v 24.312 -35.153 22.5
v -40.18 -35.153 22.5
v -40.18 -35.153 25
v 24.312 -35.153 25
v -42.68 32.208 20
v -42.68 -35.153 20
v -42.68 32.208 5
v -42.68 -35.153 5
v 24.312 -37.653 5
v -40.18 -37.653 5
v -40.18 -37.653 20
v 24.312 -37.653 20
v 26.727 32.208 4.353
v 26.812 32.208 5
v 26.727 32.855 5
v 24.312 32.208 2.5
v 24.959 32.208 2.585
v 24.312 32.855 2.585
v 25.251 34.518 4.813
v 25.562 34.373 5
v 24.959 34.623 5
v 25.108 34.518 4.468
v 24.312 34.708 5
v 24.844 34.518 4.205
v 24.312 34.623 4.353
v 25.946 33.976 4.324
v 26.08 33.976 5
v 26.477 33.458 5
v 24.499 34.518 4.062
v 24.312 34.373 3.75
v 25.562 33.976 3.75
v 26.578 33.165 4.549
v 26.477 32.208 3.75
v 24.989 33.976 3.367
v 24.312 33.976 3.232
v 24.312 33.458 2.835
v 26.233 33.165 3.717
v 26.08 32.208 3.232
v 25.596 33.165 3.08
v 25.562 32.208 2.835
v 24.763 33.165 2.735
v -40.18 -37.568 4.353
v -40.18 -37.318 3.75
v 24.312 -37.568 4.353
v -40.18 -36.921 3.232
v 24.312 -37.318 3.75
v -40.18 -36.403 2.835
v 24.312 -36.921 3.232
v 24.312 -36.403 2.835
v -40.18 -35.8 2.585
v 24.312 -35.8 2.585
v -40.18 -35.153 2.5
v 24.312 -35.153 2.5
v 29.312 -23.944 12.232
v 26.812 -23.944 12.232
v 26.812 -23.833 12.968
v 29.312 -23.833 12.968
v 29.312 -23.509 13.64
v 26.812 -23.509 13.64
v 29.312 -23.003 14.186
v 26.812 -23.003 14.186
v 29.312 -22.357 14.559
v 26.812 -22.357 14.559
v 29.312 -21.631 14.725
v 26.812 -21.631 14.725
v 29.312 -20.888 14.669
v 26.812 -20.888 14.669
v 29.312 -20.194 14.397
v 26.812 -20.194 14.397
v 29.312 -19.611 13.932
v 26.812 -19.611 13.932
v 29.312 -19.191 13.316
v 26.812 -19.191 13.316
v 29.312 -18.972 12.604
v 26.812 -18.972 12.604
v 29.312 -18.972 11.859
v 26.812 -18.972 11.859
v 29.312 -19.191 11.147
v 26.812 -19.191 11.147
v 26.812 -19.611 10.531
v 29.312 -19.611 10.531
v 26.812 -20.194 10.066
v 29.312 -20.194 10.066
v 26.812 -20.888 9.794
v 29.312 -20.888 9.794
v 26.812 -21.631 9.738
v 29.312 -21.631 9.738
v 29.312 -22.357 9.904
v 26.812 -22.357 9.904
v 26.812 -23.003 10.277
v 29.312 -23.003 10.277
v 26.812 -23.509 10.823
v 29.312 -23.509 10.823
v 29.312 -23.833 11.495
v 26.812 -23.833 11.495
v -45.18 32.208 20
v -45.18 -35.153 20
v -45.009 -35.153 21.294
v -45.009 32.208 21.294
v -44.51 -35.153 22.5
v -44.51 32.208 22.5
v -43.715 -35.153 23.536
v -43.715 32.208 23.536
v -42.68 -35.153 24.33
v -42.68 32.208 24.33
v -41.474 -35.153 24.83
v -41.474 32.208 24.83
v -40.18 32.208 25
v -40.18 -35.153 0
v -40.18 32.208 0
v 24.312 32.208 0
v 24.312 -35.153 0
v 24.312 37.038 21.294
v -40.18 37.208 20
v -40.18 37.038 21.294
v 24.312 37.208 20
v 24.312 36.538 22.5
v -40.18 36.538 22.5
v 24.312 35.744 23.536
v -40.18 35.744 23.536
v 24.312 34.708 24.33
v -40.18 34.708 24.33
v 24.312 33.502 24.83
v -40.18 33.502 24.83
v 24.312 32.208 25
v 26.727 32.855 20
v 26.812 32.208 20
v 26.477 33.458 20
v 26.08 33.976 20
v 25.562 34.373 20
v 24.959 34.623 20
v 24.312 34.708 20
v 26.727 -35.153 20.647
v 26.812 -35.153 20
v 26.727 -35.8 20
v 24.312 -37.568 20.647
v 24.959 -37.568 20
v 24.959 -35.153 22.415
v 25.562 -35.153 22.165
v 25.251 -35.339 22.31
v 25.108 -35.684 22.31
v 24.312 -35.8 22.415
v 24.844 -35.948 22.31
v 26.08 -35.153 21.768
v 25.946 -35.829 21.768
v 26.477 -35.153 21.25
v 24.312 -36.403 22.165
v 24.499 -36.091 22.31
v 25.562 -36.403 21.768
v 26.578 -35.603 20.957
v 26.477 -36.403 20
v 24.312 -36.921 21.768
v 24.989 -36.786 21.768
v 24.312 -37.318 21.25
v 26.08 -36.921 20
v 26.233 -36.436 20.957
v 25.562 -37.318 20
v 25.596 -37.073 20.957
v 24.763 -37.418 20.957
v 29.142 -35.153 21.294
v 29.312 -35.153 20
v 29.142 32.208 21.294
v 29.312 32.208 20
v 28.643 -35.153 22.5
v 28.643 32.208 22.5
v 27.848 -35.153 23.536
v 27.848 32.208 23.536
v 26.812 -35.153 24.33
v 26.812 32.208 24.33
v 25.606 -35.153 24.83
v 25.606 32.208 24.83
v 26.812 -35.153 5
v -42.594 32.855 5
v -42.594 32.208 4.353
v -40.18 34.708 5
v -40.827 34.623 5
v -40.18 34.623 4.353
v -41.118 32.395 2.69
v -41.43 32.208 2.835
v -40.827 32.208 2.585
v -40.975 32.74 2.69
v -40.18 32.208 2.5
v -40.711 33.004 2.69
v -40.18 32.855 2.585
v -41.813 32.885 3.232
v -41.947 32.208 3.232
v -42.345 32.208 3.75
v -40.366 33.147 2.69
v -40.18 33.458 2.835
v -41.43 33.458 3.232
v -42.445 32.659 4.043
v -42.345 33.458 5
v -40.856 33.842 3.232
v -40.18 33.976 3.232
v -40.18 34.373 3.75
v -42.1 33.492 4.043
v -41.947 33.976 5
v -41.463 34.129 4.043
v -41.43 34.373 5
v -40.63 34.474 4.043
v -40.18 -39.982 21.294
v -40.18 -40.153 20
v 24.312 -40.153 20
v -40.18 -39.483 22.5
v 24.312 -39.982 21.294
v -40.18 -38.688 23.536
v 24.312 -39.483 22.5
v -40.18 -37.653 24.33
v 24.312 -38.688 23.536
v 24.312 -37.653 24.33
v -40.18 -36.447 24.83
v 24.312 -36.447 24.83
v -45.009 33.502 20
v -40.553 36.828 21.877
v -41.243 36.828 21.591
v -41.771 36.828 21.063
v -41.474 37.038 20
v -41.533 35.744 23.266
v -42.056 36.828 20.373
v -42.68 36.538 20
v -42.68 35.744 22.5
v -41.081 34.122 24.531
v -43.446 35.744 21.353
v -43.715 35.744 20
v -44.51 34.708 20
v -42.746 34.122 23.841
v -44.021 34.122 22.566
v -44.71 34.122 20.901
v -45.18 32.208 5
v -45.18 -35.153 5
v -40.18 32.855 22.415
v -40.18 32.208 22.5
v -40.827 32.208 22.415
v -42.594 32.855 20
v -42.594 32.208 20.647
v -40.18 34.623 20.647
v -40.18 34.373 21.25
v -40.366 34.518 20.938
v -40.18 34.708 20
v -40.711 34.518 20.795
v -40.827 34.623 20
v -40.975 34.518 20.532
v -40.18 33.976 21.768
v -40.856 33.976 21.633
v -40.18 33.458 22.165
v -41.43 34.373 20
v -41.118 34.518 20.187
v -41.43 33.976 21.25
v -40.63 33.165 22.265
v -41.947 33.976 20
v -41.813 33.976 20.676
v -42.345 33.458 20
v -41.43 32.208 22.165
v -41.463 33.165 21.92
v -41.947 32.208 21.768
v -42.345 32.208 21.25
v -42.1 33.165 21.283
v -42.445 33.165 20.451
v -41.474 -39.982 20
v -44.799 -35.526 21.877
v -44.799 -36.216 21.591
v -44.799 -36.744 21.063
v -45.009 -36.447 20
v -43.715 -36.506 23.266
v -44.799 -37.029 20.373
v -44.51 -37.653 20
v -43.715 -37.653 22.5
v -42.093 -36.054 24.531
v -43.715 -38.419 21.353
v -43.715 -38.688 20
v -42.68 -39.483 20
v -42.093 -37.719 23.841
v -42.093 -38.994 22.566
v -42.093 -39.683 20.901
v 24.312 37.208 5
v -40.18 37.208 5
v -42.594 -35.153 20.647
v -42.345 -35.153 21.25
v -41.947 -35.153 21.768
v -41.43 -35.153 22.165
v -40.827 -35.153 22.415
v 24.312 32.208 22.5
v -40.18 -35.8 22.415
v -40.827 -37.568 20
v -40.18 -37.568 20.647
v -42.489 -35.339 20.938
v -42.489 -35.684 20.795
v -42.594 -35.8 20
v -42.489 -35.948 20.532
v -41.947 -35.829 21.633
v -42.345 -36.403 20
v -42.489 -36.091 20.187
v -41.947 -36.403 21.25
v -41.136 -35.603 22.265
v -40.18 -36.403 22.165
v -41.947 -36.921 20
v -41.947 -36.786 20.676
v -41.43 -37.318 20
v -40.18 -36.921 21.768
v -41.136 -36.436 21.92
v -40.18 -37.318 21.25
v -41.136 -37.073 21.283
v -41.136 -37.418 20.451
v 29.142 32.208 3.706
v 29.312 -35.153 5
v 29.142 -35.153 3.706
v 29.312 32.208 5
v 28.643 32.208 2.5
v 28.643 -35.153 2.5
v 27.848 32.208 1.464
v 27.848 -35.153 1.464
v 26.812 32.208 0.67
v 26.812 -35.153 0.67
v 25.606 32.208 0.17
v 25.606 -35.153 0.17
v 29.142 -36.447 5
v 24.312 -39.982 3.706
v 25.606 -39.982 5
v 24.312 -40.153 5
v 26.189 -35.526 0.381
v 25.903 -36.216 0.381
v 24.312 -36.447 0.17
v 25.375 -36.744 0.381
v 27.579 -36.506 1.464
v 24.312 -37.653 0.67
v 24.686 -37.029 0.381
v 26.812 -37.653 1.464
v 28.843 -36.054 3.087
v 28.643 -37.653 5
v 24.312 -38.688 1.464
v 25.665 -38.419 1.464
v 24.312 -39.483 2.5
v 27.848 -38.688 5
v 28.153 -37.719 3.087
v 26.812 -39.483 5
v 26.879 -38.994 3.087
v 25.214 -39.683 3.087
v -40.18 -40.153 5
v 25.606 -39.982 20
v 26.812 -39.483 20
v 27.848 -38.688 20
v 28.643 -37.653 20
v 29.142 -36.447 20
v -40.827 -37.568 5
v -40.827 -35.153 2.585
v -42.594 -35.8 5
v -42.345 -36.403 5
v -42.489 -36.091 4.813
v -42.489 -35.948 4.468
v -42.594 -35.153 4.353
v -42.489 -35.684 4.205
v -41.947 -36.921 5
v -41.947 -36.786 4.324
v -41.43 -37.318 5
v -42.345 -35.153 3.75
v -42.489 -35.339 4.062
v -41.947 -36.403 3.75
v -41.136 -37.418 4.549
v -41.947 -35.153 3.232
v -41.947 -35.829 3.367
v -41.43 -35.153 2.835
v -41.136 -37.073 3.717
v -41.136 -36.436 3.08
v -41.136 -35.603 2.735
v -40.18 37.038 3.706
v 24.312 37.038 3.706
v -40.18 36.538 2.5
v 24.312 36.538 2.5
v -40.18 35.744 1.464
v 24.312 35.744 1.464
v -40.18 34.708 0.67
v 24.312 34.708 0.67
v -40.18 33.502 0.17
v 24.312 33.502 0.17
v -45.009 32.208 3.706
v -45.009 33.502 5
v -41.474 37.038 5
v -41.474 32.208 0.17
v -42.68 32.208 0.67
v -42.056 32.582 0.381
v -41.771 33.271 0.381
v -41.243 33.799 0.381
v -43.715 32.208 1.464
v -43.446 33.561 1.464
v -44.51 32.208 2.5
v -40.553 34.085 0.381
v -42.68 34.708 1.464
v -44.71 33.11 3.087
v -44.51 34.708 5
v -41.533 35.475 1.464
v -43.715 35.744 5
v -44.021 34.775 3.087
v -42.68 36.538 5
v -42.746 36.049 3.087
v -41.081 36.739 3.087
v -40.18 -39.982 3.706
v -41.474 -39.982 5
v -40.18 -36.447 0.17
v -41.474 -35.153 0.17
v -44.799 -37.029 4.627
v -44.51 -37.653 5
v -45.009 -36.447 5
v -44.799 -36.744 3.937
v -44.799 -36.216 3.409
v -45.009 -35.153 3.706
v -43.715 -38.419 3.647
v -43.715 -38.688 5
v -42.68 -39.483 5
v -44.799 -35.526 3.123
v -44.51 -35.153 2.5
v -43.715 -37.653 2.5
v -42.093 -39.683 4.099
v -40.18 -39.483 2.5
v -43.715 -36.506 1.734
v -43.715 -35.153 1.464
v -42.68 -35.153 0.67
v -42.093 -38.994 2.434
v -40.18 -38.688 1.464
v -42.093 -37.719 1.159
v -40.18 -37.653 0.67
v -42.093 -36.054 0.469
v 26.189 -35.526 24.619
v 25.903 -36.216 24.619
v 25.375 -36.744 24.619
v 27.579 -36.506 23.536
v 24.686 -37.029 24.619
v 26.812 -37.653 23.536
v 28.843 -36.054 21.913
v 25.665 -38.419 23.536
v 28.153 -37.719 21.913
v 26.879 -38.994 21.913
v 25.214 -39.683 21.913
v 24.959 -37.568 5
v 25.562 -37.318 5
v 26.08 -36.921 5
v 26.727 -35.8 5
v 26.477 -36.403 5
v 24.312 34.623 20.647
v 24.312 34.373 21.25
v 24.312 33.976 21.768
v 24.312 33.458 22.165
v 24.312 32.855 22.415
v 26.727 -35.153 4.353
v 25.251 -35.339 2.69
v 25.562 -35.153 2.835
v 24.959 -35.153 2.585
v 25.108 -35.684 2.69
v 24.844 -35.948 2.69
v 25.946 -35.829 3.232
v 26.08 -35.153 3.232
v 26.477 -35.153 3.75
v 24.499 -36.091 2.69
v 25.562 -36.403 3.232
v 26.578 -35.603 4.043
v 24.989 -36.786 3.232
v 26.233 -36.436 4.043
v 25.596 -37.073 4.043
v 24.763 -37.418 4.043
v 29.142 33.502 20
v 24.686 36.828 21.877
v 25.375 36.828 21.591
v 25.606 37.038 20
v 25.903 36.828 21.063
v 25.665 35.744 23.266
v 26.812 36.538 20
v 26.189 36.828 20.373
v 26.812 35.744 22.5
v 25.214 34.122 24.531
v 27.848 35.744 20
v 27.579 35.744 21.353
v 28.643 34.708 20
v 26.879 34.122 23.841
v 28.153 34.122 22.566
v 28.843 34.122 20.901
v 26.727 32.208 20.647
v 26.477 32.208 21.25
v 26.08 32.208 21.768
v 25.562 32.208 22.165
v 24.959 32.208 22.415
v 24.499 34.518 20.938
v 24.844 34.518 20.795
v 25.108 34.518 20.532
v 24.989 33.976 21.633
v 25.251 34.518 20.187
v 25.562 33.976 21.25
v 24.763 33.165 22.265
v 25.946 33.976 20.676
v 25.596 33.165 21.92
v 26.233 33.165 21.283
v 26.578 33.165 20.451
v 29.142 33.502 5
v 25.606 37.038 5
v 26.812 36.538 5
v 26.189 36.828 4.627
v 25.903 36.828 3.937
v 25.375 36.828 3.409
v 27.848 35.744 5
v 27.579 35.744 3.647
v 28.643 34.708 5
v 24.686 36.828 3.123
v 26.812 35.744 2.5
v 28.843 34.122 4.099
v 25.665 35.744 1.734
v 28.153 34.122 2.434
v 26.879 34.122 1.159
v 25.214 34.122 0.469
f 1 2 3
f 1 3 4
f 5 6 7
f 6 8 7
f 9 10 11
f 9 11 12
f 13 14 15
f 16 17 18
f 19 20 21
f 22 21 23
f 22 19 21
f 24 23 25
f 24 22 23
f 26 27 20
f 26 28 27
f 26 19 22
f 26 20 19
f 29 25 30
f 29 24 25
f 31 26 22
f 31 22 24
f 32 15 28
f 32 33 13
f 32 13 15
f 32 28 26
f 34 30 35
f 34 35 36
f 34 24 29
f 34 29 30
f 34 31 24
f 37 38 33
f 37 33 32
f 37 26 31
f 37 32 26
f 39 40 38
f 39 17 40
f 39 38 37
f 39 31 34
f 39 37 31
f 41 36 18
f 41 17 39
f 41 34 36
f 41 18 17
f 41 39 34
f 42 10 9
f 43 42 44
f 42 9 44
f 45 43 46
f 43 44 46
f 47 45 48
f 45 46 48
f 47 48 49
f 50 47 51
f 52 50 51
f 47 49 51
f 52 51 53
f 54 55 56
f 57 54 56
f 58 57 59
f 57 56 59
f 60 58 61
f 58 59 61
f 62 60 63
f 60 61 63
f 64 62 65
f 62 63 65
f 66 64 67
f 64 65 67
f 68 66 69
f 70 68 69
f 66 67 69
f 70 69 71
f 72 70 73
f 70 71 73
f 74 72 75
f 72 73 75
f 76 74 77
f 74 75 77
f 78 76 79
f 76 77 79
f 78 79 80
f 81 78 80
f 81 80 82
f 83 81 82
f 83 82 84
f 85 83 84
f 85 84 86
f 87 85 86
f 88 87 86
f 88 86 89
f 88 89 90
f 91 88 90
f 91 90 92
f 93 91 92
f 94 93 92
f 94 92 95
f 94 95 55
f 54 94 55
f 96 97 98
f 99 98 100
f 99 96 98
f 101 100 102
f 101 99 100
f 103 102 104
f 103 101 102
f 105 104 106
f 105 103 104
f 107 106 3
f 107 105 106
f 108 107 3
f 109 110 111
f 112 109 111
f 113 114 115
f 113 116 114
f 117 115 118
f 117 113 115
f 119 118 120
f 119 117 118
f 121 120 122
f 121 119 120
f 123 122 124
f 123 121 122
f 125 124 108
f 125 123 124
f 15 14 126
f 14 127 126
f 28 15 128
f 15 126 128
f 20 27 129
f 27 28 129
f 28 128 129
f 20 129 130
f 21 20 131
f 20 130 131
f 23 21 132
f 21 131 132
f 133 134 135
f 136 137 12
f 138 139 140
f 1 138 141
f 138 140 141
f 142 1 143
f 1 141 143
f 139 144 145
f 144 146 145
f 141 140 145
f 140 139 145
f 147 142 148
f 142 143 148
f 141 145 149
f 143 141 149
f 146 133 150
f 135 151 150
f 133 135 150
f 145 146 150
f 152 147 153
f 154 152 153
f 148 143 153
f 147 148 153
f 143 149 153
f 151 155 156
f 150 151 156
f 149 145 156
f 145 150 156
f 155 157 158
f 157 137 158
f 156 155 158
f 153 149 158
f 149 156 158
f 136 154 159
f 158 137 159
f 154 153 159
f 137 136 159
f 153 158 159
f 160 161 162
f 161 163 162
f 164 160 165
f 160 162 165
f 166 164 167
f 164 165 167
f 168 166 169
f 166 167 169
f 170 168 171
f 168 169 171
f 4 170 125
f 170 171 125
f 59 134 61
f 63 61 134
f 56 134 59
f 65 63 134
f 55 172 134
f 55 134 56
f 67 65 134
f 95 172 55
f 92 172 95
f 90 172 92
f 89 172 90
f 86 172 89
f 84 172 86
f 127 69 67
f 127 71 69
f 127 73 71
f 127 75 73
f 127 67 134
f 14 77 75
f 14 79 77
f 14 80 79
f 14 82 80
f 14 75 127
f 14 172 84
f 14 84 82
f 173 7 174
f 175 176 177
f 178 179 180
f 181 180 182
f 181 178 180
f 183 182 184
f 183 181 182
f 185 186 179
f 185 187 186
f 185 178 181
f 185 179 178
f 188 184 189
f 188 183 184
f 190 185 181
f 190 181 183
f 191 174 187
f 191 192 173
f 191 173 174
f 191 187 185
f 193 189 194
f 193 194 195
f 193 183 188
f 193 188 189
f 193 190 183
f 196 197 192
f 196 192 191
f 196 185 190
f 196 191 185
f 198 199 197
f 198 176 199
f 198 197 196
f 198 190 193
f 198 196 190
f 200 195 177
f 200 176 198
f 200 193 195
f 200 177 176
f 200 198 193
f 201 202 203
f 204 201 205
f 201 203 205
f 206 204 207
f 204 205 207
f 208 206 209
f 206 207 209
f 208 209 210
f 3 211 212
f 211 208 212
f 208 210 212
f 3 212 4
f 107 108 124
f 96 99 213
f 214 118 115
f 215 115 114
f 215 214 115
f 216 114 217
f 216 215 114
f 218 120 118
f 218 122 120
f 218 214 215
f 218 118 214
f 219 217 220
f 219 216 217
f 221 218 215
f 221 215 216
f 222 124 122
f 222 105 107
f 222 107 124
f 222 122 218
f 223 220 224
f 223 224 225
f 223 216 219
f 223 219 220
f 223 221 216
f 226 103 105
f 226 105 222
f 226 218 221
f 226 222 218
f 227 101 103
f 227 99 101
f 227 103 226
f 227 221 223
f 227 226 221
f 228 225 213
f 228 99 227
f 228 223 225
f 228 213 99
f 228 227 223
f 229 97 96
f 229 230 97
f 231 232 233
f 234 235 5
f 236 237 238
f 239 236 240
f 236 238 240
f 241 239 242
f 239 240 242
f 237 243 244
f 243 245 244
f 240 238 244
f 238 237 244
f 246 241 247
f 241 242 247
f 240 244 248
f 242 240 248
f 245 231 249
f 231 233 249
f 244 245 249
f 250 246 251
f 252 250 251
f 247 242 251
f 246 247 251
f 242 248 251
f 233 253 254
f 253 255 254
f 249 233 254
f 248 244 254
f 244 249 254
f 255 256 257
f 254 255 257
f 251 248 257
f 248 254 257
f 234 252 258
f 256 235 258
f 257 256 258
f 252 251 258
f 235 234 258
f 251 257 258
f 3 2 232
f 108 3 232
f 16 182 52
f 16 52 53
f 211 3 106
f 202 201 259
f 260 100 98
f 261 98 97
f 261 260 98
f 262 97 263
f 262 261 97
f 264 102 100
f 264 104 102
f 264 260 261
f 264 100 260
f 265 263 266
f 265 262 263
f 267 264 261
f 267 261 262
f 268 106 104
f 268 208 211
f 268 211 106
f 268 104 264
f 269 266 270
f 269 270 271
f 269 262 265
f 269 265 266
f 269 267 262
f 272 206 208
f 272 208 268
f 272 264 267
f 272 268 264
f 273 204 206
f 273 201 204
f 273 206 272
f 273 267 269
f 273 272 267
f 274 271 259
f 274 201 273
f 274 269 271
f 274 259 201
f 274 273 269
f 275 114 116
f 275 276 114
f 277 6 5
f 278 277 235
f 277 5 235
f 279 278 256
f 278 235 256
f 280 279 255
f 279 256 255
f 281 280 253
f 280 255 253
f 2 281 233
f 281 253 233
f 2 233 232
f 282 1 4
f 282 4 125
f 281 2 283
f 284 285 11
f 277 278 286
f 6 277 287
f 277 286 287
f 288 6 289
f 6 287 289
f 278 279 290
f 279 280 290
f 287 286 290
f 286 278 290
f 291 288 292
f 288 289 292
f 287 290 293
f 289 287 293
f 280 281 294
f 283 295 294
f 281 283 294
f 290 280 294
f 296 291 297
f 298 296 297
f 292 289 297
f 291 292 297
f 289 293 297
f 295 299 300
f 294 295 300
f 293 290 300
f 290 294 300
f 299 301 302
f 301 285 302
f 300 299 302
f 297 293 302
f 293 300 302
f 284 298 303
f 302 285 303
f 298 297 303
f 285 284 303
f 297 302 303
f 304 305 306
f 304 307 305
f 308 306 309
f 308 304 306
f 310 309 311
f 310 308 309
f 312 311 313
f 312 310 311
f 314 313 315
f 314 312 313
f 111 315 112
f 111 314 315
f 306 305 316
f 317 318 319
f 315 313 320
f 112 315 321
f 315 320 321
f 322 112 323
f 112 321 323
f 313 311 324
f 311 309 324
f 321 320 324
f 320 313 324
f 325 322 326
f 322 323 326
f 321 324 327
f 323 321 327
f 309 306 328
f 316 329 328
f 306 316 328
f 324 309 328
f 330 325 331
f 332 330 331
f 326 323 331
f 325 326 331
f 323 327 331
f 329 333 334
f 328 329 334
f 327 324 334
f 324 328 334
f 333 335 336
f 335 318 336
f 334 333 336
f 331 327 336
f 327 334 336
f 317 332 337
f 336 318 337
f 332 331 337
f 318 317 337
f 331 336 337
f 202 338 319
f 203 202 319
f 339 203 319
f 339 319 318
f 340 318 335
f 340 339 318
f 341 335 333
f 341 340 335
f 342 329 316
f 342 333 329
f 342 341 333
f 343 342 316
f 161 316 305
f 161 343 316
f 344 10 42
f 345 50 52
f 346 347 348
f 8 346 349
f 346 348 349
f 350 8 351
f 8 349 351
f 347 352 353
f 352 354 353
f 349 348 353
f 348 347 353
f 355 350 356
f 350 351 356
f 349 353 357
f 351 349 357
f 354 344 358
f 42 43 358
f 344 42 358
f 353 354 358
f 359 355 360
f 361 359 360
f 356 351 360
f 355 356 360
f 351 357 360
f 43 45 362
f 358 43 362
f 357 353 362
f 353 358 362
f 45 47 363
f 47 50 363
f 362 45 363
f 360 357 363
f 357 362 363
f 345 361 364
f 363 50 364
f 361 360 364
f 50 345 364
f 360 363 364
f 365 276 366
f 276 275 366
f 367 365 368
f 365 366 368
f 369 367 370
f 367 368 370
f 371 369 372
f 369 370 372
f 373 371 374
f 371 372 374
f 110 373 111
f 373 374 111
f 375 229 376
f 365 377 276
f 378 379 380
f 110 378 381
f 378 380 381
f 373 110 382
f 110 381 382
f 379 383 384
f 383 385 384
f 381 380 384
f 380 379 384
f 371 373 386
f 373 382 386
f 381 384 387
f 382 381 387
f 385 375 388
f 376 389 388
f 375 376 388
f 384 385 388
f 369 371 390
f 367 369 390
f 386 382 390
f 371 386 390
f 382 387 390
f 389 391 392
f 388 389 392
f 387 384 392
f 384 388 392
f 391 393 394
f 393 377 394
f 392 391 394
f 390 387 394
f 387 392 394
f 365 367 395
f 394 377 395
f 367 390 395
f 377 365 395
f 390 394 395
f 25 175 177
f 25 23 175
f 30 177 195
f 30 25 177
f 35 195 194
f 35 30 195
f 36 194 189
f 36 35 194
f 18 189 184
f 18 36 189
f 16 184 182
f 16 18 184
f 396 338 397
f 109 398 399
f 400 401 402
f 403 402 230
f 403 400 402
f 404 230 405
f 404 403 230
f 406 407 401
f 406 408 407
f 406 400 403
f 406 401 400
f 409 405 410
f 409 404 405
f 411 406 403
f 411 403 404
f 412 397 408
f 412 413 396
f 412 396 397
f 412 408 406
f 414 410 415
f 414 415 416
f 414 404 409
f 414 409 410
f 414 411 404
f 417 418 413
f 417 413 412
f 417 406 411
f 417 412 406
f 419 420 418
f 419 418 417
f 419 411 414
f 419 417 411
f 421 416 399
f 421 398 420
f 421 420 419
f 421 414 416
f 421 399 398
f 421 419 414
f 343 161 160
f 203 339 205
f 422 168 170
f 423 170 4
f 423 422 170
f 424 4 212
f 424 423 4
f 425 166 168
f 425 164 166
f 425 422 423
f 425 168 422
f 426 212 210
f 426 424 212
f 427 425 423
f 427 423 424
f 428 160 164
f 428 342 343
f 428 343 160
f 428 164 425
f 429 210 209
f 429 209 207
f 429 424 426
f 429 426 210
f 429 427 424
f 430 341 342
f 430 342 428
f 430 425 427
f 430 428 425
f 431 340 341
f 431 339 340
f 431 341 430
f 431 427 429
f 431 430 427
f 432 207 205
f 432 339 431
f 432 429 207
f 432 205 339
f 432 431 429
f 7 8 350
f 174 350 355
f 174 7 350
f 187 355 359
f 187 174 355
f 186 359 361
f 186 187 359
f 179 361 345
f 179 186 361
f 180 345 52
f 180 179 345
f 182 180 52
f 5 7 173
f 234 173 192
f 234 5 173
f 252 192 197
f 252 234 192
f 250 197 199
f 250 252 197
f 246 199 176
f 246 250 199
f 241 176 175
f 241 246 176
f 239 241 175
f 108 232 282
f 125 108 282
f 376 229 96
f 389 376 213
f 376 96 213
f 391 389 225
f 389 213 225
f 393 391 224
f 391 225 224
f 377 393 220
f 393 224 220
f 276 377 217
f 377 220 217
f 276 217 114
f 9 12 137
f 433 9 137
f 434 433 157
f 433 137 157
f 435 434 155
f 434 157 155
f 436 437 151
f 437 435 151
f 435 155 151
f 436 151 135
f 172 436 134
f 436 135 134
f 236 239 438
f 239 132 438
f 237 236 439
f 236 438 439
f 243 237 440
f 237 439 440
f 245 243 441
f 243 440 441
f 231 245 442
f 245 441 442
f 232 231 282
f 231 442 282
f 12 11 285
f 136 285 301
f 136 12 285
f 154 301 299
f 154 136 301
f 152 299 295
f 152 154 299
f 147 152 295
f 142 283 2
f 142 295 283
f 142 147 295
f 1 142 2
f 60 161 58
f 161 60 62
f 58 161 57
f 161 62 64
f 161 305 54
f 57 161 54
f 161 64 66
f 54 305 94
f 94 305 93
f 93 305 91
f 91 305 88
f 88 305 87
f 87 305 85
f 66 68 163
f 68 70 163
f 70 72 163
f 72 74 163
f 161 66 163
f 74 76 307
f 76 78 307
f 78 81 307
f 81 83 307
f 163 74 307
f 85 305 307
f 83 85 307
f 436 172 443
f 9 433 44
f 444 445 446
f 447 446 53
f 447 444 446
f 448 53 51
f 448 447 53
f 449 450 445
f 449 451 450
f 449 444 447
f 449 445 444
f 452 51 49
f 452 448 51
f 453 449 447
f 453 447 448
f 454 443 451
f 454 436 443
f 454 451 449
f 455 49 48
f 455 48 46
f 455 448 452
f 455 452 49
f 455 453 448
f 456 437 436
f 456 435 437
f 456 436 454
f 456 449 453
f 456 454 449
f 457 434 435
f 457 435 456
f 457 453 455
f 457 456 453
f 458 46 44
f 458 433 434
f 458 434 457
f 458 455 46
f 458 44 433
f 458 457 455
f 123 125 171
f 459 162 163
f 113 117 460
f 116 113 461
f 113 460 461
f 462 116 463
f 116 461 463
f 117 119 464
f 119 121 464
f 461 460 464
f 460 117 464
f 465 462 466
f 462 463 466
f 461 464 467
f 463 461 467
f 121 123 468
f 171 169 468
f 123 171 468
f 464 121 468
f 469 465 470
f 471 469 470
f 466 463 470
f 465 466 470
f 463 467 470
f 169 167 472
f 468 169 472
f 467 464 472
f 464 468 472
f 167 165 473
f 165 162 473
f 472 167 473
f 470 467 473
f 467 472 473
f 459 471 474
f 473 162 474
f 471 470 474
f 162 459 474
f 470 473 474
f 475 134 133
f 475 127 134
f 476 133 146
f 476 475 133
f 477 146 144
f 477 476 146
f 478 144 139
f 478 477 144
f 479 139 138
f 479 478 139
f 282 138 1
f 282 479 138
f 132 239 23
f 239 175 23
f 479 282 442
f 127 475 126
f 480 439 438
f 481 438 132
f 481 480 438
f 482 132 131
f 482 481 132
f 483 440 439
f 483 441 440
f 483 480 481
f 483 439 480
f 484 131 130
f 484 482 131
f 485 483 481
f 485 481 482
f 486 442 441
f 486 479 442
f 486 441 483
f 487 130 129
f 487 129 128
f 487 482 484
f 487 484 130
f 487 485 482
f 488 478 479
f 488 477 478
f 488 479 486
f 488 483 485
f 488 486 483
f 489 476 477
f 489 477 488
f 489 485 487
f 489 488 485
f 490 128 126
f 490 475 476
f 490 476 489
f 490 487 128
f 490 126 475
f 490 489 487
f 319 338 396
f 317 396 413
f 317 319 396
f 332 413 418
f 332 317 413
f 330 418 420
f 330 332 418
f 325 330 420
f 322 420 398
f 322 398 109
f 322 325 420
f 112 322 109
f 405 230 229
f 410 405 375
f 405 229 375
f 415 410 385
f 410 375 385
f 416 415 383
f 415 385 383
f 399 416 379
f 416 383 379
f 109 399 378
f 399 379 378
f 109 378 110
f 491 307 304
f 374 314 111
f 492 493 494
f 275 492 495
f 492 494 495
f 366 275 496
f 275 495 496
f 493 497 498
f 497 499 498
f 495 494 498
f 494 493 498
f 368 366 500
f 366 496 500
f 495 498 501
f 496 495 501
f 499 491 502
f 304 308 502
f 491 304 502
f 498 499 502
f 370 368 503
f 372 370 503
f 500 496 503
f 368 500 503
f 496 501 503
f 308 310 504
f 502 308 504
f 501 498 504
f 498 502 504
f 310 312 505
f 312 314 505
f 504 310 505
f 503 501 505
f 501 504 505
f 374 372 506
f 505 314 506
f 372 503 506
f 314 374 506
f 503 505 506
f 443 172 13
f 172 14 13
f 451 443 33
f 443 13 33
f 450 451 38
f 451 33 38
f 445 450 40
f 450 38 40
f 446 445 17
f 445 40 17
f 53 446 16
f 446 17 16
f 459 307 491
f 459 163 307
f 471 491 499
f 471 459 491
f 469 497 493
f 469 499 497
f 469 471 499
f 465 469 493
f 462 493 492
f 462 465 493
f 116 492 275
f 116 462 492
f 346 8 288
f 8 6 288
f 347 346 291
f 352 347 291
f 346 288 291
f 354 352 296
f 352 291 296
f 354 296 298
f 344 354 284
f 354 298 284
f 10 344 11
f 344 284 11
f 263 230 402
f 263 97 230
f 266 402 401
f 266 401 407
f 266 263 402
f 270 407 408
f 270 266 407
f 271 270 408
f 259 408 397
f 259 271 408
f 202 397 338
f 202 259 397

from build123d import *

# Parameters (mm, degrees)
F0_W     = 74.4920149446
F0_H     = 77.3611664772
F1_DEPTH = 25
F2_R     = 5
F3_T     = -2.5
F5_D     = 5
F5_DEPTH = 12
F5_TIP   = 1.5021515476


# Not quite as in the source:
# - a shell that OpenCascade refuses in one call is made with other operations: the cavity is built on its own and cut out


with BuildPart() as f1:
    # F0 (on Top) → F1 (new body)
    with BuildSketch(Plane.XY):
        with Locations((-7.9336054623, -1.4722160995)):
            Rectangle(F0_W, F0_H)
    extrude(amount=F1_DEPTH)

    # F2
    f2_edges = [f1.edges().sort_by_distance(p)[0] for p in [
        (29.312402, -40.152799, 12.5),
        (29.312402, -1.472216, 25),
        (-7.933605, -40.152799, 25),
        (-45.179613, -1.472216, 25),
        (-7.933605, 37.208367, 25),
        (29.312402, -1.472216, 0),
        (-7.933605, -40.152799, 0),
        (29.312402, 37.208367, 12.5),
        (-45.179613, -40.152799, 12.5),
        (-45.179613, 37.208367, 12.5),
        (-45.179613, -1.472216, 0),
        (-7.933605, 37.208367, 0),
    ]]
    fillet(f2_edges, radius=F2_R)

    # F3: a shell. OpenCascade refuses it in one call, so the cavity is built on its own and cut out:
    # the body offset inwards by the wall thickness, plus a prism from it out through each open face.
    f3_core = offset(f1.part, amount=F3_T, mode=Mode.PRIVATE)
    f3_exits = [f3_core.faces().sort_by_distance(p)[0] for p in [
        (-7.933605, -1.472216, 22.5),
    ]]
    add(f3_core, mode=Mode.SUBTRACT)
    extrude(f3_exits, amount=-F3_T, mode=Mode.SUBTRACT)

    # F5
    with Locations(Plane.YZ.offset(29.31240201)):
        with Locations((-21.4438159019, 12.2315008193)):
            Hole(F5_D / 2, depth=F5_DEPTH)
            with Locations((0, 0, -(F5_DEPTH + F5_TIP / 2))):  # 118° drill point
                Cone(0, F5_D / 2, F5_TIP, mode=Mode.SUBTRACT)


solid = f1.part
